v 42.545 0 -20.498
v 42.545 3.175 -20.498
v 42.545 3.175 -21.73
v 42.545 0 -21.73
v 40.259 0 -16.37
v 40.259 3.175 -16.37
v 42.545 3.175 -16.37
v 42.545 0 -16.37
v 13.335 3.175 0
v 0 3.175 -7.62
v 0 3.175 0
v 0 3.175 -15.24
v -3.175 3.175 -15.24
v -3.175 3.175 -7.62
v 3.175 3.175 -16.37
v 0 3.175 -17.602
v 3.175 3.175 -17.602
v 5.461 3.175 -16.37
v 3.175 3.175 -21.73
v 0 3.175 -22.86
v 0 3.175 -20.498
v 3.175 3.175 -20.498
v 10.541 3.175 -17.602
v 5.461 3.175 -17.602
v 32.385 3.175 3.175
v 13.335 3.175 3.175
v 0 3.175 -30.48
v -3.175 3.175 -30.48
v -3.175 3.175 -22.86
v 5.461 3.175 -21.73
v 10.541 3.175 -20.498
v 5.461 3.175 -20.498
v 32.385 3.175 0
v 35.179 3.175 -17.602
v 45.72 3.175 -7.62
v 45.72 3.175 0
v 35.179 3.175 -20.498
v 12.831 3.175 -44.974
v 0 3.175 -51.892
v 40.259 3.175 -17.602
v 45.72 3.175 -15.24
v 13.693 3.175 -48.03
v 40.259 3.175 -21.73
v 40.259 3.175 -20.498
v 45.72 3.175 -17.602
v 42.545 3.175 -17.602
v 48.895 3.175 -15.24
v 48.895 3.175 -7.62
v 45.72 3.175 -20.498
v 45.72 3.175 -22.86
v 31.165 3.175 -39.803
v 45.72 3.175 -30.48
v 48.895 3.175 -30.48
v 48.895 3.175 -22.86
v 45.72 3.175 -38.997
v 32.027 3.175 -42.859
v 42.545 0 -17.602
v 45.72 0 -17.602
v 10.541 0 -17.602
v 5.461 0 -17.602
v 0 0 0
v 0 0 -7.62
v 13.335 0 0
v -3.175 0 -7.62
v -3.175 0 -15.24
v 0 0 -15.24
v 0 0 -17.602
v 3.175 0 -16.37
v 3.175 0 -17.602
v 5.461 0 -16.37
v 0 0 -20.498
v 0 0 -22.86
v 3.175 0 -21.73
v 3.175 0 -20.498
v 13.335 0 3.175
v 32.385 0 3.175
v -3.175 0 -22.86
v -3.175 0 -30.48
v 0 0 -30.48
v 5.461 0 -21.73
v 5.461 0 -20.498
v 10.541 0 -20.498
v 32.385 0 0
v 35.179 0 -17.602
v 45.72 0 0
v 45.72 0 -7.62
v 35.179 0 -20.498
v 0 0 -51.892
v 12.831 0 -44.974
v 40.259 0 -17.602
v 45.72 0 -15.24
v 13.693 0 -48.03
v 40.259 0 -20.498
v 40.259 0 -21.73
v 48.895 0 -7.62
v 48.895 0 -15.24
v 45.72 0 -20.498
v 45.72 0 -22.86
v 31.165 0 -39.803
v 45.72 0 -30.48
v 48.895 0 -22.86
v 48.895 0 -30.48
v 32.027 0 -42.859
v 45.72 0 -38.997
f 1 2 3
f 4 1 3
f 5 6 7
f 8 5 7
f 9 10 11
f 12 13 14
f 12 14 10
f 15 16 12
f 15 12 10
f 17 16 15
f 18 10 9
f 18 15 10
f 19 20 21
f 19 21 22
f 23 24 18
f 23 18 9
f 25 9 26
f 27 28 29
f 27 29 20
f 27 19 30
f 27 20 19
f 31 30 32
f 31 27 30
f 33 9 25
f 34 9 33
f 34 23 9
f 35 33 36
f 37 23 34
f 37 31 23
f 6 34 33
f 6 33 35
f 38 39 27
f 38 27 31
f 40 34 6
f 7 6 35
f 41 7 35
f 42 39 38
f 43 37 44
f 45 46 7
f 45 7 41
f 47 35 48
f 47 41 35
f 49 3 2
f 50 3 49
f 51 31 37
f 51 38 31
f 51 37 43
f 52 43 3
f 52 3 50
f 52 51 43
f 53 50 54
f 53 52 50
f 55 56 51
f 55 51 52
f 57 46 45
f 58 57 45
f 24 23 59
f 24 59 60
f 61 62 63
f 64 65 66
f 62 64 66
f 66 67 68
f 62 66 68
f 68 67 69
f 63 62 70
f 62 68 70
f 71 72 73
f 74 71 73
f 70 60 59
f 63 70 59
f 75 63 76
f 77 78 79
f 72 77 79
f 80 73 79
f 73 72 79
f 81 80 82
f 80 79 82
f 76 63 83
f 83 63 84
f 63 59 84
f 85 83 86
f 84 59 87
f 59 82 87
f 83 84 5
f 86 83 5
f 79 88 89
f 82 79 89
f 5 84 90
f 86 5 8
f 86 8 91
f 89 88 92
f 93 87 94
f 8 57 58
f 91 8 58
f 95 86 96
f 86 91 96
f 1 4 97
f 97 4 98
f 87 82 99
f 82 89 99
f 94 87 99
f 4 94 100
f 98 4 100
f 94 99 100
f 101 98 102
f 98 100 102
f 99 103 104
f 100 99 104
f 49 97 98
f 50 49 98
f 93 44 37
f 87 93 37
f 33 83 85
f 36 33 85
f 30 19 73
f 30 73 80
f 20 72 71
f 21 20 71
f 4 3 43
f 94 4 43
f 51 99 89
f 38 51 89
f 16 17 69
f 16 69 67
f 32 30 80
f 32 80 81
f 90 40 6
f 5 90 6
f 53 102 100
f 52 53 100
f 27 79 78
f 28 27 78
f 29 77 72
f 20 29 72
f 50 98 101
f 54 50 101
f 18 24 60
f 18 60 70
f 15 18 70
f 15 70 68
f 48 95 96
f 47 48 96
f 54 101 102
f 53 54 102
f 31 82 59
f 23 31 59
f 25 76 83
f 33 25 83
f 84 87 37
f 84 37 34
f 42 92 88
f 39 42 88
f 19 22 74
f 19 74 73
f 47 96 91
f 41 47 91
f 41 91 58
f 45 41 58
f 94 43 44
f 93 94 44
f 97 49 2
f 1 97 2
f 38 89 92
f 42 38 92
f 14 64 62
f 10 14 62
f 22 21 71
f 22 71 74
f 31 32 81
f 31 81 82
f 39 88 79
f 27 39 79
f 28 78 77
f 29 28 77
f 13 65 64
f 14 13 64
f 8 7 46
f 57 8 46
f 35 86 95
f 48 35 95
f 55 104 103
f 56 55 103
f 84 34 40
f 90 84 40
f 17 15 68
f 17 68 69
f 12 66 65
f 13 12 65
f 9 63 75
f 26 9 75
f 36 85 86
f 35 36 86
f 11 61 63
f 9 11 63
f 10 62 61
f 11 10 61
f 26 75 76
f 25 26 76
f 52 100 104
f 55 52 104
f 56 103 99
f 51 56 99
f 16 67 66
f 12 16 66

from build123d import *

# Parameters (mm, degrees)
BOSS_EXTRUDE1_DEPTH = 3.175
CUT_EXTRUDE1_DEPTH  = 72.369475764


with BuildPart() as part:
    # Sketch1 → Boss-Extrude1 (new body)
    with BuildSketch(Plane(origin=(0, 0, 0), x_dir=(1, 0, 0), z_dir=(0, 1, 0))):
        Polygon((0, 0), (13.335, 0), (13.335, -3.175), (32.385, -3.175), (32.385, 0), (45.72, 0), (45.72, 7.62), (48.895, 7.62), (48.895, 15.24), (45.72, 15.24), (45.72, 22.86), (48.895, 22.86), (48.895, 30.48), (45.72, 30.48), (45.72, 38.99662), (32.027322928, 42.858715639), (31.165424808, 39.802941329), (12.830778951, 44.974330052), (13.692677072, 48.030104361), (0, 51.8922), (0, 30.48), (-3.175, 30.48), (-3.175, 22.86), (0, 22.86), (0, 15.24), (-3.175, 15.24), (-3.175, 7.62), (0, 7.62), align=None)
    extrude(amount=BOSS_EXTRUDE1_DEPTH)

    # Sketch2 → Cut-Extrude1 (cut, through all)
    with BuildSketch(Plane(origin=(0, 3.175, 0), x_dir=(1, 0, 0), z_dir=(0, 1, 0))):
        Polygon((0, 20.4978), (3.175, 20.4978), (3.175, 21.7297), (5.461, 21.7297), (5.461, 20.4978), (10.541, 20.4978), (10.541, 17.6022), (5.461, 17.6022), (5.461, 16.3703), (3.175, 16.3703), (3.175, 17.6022), (0, 17.6022), align=None)
        Polygon((42.545, 17.6022), (45.72, 17.6022), (45.72, 20.4978), (42.545, 20.4978), (42.545, 21.7297), (40.259, 21.7297), (40.259, 20.4978), (35.179, 20.4978), (35.179, 17.6022), (40.259, 17.6022), (40.259, 16.3703), (42.545, 16.3703), align=None)
    extrude(amount=-CUT_EXTRUDE1_DEPTH, mode=Mode.SUBTRACT)


solid = part.part
